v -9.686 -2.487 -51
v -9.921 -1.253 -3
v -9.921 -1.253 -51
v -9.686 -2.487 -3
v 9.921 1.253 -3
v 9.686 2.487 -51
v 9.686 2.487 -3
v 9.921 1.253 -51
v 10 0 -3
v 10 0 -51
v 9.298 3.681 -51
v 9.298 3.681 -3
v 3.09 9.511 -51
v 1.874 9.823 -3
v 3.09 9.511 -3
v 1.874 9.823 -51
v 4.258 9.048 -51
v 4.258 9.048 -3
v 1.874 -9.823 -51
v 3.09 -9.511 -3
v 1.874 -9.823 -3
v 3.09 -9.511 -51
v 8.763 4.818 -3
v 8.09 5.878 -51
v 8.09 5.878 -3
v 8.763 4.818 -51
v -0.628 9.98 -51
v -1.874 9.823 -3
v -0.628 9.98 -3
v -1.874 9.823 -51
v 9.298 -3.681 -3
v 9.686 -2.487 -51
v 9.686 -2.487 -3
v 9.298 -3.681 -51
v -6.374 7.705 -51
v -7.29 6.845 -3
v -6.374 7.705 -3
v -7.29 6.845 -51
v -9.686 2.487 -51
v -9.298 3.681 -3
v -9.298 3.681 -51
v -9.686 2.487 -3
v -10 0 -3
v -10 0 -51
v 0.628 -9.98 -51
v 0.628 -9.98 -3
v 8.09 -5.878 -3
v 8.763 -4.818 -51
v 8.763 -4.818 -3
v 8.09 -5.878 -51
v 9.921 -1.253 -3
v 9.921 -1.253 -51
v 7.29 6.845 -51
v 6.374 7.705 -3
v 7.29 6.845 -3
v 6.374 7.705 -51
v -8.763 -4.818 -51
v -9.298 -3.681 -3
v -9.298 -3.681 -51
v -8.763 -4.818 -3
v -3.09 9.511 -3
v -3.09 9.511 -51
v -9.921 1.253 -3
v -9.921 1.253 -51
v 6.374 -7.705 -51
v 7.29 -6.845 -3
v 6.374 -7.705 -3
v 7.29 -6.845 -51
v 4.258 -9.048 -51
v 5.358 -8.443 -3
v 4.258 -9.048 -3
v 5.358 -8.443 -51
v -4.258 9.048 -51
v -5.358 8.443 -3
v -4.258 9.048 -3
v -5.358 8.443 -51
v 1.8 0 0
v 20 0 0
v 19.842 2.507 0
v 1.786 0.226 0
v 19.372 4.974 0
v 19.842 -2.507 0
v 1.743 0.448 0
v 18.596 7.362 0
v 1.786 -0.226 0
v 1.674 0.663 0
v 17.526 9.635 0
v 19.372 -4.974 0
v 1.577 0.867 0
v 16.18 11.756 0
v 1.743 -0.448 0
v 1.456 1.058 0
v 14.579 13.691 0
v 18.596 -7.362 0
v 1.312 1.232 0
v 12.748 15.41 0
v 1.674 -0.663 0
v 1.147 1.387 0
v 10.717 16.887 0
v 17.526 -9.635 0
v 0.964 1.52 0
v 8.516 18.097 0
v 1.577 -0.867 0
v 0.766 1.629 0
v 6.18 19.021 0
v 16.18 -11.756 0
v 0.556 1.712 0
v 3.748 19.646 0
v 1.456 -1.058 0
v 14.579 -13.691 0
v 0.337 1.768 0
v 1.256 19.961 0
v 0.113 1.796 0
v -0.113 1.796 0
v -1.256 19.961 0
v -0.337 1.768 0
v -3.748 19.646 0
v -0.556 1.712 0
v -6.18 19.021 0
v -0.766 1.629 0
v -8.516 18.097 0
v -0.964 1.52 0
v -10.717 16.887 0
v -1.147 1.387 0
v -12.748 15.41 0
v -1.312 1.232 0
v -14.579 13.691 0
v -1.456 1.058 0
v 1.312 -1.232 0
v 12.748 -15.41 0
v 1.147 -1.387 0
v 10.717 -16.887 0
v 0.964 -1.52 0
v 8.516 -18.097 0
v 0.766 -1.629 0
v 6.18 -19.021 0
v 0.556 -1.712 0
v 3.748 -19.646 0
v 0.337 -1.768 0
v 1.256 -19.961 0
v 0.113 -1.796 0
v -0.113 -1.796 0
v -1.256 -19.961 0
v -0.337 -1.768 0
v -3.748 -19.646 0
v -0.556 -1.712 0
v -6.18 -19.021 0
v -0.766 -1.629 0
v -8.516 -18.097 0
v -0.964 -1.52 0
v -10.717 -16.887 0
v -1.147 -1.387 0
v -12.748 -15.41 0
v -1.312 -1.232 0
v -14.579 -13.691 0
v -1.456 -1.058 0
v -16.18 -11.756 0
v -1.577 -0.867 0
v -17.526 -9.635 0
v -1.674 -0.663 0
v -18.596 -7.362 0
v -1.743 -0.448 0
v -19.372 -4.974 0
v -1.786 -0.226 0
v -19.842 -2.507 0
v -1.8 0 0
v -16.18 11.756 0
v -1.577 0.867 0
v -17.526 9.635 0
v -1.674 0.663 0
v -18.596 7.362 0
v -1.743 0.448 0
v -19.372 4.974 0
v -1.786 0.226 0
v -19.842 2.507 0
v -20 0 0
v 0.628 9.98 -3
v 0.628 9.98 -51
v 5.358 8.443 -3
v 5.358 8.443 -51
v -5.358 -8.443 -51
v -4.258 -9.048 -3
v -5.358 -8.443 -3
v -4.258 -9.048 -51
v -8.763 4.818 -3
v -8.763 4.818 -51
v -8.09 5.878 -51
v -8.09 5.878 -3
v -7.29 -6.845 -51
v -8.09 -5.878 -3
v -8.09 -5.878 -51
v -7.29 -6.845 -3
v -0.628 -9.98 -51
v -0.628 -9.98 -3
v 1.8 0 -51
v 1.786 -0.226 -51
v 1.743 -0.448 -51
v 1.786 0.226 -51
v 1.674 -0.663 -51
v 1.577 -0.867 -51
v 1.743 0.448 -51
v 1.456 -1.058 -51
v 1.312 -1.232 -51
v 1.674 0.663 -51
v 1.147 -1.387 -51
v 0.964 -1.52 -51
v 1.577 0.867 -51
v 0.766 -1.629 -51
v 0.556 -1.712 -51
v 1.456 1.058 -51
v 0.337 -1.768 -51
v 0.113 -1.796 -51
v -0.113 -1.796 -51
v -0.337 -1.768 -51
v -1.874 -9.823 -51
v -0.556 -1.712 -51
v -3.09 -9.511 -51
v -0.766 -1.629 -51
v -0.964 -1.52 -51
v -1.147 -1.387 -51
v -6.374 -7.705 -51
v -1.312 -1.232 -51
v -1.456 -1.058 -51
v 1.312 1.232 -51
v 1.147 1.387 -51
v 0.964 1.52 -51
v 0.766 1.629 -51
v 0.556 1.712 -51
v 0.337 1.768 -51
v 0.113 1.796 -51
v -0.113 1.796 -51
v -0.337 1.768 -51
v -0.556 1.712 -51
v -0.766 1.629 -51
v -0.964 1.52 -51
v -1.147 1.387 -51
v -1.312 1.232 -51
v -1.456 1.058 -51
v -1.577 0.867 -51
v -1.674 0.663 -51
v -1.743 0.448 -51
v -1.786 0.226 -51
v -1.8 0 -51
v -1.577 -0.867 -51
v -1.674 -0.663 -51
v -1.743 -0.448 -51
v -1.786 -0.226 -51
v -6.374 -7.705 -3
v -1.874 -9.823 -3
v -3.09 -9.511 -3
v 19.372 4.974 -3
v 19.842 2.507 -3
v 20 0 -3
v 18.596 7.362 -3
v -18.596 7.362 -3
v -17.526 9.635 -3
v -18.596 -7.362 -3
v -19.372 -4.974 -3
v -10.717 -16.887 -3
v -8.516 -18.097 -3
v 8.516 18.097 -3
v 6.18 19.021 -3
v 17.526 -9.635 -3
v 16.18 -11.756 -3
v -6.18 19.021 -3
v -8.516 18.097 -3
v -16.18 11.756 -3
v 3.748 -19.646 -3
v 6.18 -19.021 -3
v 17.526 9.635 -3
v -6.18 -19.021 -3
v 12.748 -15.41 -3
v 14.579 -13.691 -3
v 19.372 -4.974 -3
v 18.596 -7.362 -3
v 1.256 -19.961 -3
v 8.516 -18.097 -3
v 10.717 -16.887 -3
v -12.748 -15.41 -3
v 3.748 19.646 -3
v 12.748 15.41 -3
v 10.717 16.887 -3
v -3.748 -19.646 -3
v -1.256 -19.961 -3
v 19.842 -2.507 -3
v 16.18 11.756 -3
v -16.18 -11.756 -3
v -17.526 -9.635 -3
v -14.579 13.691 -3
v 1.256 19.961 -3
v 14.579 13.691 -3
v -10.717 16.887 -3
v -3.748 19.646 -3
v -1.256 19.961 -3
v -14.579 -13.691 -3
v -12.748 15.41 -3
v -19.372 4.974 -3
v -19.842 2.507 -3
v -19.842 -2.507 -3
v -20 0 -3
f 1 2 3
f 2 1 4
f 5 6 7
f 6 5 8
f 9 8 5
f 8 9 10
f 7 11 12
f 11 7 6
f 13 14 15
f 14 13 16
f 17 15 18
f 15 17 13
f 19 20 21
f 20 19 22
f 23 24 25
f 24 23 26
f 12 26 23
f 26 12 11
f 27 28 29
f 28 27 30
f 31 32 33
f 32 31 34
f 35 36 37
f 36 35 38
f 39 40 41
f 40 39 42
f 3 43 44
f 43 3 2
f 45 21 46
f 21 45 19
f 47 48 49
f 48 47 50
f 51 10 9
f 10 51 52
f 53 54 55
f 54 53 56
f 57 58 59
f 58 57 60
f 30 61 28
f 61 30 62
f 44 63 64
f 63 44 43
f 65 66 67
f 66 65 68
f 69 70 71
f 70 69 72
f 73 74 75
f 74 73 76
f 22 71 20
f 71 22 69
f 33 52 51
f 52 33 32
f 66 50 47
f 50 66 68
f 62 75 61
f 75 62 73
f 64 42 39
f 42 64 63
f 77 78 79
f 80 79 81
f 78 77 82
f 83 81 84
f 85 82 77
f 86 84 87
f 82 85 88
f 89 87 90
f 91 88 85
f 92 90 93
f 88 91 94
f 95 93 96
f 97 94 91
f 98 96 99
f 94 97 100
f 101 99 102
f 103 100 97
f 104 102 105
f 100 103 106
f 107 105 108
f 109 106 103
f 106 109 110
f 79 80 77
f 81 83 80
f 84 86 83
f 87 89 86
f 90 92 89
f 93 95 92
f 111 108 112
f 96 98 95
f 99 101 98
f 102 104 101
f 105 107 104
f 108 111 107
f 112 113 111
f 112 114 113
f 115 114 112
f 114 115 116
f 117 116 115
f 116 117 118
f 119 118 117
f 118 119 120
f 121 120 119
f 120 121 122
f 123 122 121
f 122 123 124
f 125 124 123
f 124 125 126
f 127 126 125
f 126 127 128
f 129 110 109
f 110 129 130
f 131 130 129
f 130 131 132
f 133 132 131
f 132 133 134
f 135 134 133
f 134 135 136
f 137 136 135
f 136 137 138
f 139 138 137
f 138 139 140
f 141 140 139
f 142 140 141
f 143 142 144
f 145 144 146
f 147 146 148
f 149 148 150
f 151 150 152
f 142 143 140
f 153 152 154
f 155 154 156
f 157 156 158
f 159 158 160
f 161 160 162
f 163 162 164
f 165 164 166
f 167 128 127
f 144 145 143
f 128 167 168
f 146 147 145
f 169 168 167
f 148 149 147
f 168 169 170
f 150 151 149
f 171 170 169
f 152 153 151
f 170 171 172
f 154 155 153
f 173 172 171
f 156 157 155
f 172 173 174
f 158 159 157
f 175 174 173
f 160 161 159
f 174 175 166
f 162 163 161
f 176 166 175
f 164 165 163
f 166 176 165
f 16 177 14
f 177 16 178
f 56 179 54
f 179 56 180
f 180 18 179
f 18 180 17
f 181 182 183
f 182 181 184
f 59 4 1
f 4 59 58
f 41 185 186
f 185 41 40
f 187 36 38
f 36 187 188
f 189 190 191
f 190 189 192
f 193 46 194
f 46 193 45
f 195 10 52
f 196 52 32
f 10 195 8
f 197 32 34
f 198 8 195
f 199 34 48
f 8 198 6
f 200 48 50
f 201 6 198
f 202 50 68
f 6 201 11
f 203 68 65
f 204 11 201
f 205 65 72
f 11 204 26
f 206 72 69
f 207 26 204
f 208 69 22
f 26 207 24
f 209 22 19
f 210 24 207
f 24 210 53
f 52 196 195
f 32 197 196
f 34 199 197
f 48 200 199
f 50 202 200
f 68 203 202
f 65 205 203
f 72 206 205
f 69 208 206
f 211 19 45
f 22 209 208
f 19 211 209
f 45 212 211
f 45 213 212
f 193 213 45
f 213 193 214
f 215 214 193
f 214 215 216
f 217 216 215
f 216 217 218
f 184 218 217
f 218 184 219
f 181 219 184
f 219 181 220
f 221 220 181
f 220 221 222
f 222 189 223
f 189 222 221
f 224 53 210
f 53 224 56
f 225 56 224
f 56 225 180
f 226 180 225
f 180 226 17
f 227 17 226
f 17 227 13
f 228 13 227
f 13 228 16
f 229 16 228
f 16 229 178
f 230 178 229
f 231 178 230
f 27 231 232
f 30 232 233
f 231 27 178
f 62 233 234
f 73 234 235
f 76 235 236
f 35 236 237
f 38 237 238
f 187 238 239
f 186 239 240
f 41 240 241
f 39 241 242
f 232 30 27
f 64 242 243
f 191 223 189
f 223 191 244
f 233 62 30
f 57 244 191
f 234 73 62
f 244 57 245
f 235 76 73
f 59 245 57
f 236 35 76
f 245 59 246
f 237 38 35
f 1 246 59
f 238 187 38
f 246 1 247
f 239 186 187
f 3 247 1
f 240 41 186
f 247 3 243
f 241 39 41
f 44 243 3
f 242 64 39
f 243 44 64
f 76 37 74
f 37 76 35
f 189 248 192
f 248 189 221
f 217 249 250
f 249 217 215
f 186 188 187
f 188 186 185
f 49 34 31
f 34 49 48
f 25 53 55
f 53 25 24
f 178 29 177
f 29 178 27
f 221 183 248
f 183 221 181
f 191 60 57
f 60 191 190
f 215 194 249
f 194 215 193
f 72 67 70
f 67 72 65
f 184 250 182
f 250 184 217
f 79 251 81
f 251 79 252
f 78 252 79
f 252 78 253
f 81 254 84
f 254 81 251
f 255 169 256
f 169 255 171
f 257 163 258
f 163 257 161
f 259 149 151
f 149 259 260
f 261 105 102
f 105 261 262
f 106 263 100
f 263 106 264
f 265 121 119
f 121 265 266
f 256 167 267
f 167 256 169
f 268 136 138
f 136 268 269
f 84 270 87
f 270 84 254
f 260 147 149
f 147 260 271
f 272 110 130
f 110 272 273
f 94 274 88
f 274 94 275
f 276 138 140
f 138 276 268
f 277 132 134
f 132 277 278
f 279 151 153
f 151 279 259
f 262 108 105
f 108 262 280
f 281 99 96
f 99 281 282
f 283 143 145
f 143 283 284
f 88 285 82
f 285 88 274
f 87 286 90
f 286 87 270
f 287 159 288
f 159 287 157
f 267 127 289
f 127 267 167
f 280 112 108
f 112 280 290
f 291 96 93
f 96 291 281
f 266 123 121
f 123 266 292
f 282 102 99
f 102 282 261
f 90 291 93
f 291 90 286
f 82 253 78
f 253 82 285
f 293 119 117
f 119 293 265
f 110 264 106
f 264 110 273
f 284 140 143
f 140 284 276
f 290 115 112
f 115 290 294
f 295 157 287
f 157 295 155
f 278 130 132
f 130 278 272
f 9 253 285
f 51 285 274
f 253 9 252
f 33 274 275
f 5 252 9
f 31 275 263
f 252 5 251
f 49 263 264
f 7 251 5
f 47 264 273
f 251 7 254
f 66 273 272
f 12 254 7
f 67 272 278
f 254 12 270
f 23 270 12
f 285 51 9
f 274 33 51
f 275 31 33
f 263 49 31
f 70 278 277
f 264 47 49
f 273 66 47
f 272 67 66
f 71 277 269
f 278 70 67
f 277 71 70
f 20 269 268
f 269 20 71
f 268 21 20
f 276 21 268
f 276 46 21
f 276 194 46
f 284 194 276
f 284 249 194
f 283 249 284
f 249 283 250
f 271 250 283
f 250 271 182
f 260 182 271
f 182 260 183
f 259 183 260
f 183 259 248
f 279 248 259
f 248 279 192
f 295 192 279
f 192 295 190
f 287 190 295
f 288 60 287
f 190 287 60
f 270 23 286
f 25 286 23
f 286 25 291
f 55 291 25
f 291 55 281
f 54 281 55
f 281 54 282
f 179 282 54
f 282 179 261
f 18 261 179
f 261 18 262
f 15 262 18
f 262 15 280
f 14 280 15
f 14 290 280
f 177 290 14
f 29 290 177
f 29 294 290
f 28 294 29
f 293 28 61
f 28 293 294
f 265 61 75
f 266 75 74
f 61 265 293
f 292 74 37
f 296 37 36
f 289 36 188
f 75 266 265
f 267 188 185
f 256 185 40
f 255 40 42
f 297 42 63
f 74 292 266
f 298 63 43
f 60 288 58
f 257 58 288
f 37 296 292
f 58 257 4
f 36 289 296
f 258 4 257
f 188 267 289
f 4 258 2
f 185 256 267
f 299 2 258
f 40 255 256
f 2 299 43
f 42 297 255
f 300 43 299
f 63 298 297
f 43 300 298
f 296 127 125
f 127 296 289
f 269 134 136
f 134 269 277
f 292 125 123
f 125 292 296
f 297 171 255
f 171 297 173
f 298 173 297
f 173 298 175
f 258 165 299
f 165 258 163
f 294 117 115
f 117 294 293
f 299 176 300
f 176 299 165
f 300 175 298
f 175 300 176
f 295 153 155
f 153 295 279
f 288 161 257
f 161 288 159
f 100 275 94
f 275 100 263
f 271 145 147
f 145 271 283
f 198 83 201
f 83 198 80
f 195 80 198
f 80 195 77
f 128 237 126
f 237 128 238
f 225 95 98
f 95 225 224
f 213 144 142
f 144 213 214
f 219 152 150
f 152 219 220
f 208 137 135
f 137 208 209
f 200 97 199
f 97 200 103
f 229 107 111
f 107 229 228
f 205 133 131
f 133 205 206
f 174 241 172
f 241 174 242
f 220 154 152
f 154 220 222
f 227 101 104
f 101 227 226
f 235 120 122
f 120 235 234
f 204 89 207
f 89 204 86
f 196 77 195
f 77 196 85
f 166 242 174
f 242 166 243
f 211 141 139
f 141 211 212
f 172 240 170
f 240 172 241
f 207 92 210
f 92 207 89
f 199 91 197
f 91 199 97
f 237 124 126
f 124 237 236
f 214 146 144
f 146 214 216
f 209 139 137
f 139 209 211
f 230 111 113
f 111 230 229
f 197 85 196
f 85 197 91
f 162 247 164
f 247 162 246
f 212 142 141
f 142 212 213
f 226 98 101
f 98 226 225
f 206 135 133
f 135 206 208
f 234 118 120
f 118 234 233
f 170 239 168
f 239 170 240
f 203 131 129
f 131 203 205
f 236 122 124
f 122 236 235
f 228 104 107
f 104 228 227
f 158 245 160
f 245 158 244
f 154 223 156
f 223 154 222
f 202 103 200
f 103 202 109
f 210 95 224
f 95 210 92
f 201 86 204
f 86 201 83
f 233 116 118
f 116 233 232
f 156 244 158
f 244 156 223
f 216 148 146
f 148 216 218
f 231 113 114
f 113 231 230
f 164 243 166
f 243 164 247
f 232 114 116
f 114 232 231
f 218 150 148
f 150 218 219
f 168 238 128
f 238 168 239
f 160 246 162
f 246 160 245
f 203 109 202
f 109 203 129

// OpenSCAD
$fn = 50;


difference() {
	union() {
		translate(v = [0, 0, -51.0000000000]) {
			cylinder(h = 51, r = 10.0000000000);
		}
		translate(v = [0, 0, -3.0000000000]) {
			cylinder(h = 3, r = 20.0000000000);
		}
	}
	union() {
		#translate(v = [0, 0, -51]) {
			cylinder(h = 51, r = 1.8000000000);
		}
	}
}
